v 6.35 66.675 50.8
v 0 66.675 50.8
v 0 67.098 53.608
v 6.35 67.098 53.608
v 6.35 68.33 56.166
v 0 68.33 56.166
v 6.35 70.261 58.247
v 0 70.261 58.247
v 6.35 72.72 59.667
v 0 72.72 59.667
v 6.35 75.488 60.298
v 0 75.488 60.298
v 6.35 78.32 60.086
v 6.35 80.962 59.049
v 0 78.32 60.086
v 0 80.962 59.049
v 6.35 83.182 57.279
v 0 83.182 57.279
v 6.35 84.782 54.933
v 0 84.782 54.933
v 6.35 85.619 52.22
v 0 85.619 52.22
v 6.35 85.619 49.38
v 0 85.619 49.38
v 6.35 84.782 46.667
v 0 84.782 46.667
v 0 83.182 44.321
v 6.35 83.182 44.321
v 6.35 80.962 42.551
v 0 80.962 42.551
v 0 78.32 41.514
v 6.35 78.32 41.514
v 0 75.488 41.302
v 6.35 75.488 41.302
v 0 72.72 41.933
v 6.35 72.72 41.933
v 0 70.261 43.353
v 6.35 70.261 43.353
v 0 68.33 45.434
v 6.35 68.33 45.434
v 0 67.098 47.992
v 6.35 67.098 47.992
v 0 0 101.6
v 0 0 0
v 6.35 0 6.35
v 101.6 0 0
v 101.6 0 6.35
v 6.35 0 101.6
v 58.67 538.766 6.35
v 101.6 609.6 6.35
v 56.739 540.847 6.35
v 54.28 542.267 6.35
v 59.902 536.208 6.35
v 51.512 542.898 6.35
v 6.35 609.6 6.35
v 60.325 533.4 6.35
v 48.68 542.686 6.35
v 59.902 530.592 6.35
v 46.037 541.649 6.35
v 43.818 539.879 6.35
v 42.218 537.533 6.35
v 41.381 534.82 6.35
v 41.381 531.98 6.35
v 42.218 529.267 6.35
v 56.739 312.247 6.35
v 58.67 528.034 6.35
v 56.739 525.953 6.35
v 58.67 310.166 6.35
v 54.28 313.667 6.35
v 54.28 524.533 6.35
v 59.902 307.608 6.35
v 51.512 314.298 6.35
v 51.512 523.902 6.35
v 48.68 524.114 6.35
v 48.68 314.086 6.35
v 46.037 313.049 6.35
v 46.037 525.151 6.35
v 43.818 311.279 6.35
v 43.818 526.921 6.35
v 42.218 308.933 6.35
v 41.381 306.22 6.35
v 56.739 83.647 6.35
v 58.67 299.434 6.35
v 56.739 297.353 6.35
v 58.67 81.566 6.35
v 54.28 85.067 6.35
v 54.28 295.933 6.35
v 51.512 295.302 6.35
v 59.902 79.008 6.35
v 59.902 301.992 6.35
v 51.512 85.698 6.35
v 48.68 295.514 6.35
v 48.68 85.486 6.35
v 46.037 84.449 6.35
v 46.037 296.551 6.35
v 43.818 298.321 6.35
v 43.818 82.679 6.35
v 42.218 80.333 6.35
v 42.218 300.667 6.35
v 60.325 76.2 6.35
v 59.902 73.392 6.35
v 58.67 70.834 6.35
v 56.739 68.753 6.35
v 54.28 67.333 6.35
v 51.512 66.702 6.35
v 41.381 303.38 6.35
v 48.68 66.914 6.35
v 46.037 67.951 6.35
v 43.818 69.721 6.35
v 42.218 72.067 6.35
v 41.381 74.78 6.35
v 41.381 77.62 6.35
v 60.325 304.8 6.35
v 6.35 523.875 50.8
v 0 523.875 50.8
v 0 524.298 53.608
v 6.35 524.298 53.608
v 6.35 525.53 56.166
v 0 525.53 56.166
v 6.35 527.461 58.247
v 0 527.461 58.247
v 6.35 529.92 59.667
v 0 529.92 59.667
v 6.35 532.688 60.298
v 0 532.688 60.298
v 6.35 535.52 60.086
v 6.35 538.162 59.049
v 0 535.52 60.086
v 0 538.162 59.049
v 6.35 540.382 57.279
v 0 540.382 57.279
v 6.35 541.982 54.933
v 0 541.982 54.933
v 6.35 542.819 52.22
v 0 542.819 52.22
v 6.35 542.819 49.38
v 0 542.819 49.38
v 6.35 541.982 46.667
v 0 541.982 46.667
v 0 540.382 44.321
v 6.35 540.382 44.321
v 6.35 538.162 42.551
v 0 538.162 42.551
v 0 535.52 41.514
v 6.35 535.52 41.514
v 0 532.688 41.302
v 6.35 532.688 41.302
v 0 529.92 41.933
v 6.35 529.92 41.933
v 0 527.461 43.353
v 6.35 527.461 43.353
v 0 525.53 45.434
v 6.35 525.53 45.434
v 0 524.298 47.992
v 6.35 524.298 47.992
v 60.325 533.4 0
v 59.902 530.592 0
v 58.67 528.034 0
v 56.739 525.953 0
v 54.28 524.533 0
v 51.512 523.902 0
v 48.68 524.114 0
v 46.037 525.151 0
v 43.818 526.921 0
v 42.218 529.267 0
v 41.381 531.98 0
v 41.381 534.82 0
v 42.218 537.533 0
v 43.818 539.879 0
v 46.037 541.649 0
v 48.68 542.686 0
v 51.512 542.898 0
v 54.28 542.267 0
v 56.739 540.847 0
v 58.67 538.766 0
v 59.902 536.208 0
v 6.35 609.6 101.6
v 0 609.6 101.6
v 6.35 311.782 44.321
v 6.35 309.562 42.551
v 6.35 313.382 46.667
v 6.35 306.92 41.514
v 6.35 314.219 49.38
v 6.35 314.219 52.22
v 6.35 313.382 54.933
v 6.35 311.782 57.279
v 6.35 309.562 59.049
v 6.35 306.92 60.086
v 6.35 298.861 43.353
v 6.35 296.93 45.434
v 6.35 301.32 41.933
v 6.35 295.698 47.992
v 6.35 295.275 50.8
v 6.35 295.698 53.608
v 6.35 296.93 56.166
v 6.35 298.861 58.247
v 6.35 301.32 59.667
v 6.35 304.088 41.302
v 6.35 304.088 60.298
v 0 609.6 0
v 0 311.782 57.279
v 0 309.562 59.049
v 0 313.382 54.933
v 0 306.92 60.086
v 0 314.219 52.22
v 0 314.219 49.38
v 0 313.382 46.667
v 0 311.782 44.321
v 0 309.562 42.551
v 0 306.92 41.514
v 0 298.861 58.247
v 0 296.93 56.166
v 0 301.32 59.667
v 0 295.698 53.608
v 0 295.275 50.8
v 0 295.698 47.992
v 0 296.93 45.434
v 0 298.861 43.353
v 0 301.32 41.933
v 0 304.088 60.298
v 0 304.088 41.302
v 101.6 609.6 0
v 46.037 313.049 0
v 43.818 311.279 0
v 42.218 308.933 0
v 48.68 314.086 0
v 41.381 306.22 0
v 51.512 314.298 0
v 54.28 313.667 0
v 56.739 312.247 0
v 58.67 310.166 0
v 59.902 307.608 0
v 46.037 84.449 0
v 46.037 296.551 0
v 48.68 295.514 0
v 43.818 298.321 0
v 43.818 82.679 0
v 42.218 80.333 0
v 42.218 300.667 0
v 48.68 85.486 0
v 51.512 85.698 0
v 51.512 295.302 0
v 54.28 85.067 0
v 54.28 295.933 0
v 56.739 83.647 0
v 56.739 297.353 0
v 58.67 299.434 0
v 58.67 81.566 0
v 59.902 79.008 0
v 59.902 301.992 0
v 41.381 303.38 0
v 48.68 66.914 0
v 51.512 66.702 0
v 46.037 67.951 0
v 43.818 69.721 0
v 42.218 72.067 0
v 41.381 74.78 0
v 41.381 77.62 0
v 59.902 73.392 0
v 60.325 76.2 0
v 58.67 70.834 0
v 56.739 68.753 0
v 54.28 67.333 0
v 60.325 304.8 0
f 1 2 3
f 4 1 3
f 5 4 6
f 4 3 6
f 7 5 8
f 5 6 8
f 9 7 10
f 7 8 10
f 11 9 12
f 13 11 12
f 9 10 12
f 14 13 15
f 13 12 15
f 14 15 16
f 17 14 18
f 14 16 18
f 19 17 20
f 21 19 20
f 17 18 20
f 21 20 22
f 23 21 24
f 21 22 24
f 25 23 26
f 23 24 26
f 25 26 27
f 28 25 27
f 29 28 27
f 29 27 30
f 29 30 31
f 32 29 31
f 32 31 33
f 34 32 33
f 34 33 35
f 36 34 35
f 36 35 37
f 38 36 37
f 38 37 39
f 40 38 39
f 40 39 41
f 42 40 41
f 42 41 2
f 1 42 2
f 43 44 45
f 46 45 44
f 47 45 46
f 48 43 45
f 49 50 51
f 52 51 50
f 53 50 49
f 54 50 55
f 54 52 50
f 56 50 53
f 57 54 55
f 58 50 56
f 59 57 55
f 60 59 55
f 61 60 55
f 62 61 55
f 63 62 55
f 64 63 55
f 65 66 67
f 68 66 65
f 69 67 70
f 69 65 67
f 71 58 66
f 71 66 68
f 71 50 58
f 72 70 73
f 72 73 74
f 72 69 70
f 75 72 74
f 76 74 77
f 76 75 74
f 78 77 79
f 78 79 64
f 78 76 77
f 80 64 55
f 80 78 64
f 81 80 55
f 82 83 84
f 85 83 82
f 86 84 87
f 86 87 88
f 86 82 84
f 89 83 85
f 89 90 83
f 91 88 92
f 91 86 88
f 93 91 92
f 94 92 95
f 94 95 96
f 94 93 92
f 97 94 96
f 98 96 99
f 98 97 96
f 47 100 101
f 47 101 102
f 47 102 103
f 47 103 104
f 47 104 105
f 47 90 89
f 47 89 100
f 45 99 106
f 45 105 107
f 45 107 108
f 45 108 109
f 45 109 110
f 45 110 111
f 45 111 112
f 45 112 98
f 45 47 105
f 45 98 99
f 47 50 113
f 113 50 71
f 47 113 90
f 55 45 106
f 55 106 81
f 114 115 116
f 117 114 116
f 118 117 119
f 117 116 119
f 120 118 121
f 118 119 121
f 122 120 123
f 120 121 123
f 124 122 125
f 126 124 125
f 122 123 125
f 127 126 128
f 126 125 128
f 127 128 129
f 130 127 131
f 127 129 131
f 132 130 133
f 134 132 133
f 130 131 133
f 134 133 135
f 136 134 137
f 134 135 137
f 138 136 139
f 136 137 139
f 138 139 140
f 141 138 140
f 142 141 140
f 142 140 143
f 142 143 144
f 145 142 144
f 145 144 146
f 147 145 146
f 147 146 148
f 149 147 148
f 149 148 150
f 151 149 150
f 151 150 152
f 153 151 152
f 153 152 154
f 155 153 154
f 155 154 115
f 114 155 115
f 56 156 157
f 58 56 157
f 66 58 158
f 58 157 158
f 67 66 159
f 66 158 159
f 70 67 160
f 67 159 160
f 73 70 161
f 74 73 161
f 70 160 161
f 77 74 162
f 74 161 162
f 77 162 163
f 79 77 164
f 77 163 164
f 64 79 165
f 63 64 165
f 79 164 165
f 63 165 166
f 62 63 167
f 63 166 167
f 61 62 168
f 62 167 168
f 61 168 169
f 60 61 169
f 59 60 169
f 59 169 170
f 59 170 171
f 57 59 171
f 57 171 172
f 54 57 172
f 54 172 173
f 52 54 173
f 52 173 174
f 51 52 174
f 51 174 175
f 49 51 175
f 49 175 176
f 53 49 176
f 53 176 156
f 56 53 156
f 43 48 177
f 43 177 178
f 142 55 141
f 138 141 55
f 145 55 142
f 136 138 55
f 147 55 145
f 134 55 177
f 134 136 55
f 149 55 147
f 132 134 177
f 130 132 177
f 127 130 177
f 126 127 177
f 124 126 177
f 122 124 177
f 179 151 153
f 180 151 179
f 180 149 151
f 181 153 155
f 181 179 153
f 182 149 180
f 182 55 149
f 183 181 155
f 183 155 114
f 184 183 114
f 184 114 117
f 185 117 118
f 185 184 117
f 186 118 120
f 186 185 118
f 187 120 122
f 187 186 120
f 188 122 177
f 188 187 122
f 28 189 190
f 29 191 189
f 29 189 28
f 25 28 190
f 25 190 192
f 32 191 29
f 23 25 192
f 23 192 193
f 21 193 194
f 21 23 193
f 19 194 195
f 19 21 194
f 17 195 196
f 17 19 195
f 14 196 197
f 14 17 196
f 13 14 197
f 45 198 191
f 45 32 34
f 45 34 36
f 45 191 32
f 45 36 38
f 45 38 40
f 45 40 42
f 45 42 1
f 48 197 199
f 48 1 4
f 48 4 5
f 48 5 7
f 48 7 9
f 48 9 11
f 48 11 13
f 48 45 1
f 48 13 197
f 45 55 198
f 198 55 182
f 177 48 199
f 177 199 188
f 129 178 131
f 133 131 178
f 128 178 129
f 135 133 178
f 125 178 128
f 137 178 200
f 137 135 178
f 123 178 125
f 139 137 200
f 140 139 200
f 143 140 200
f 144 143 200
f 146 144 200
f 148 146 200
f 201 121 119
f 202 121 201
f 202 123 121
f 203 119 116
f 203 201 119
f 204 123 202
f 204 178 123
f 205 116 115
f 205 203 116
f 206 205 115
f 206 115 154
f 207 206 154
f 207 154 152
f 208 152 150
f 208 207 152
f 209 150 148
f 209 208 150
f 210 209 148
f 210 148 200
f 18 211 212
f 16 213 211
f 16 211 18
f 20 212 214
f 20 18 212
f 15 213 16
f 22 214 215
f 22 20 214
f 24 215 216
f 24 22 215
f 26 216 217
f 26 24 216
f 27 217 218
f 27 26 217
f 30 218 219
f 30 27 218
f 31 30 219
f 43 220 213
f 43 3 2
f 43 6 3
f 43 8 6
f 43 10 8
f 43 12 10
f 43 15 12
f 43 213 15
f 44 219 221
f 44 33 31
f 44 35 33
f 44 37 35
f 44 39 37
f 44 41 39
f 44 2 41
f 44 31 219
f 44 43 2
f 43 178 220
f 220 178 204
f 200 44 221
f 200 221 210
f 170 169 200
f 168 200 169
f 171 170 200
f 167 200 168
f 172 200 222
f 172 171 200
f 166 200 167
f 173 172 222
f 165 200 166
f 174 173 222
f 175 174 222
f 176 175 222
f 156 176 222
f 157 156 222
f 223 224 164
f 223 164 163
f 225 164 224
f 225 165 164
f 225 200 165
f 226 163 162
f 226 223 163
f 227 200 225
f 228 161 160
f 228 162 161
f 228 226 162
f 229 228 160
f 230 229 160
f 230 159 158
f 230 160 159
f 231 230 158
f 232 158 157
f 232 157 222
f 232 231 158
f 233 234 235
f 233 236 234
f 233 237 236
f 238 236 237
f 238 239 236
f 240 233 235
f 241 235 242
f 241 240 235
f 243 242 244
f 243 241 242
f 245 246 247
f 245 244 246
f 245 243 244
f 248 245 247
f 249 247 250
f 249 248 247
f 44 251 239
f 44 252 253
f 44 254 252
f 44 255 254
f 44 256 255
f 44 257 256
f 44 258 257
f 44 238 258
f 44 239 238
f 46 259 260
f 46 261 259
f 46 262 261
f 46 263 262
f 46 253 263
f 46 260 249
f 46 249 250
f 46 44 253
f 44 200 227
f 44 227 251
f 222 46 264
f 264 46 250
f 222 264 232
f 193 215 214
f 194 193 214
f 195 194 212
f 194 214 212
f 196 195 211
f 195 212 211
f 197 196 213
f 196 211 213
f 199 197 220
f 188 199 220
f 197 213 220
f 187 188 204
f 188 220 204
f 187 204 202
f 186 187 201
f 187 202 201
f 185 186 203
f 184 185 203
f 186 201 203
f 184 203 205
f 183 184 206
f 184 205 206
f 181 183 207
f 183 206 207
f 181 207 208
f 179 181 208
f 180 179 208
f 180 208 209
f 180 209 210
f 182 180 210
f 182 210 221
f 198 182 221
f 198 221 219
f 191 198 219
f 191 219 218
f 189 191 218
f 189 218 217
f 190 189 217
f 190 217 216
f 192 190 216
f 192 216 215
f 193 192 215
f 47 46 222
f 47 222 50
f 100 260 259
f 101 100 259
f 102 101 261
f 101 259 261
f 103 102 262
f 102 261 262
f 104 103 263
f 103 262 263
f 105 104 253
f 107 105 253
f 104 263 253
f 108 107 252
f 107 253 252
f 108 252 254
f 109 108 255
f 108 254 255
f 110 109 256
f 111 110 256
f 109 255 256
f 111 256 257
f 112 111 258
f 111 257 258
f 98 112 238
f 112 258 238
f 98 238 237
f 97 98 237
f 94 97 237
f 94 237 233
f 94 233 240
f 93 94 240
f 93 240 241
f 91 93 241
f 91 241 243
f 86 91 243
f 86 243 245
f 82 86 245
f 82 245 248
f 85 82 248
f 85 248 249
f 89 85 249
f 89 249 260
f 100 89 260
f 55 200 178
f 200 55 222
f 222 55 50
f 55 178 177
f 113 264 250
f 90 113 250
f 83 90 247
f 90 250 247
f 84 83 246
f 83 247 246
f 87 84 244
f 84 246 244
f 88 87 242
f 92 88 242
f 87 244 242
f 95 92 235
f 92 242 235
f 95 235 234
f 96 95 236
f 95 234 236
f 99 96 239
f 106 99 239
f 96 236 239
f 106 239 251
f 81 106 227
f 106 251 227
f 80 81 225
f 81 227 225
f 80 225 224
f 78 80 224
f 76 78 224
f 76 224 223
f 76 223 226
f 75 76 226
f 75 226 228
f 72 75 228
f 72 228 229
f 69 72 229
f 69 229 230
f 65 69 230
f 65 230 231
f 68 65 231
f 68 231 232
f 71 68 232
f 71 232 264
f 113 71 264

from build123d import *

# Parameters (mm, degrees)
F1_DEPTH = 609.6
F2_R     = 9.525
F3_DEPTH = 25.4
F4_R     = 9.525
F5_DEPTH = 25.4


with BuildPart() as f1:
    # F0 (on Front) → F1 (new body)
    with BuildSketch(Plane.XZ):
        Polygon((0, 101.6), (0, 0), (101.6, 0), (101.6, 6.35), (6.35, 6.35), (6.35, 101.6), align=None)
    extrude(amount=-F1_DEPTH)

    # F2 (on face) → F3 (cut)
    with BuildSketch(Plane(origin=(0, 0, 0), x_dir=(0, -1, 0), z_dir=(-1, 0, 0))):
        with Locations((-533.4, 50.8)):
            Circle(F2_R)
        with Locations((-304.8, 50.8)):
            Circle(F2_R)
        with Locations((-76.2, 50.8)):
            Circle(F2_R)
    extrude(amount=-F3_DEPTH, mode=Mode.SUBTRACT)

    # F4 (on face) → F5 (cut)
    with BuildSketch(Plane(origin=(0, 0, 0), x_dir=(1, 0, 0), z_dir=(0, 0, -1))):
        with Locations((50.8, -533.4)):
            Circle(F4_R)
        with Locations((50.8, -304.8)):
            Circle(F4_R)
        with Locations((50.8, -76.2)):
            Circle(F4_R)
    extrude(amount=-F5_DEPTH, mode=Mode.SUBTRACT)


solid = f1.part
